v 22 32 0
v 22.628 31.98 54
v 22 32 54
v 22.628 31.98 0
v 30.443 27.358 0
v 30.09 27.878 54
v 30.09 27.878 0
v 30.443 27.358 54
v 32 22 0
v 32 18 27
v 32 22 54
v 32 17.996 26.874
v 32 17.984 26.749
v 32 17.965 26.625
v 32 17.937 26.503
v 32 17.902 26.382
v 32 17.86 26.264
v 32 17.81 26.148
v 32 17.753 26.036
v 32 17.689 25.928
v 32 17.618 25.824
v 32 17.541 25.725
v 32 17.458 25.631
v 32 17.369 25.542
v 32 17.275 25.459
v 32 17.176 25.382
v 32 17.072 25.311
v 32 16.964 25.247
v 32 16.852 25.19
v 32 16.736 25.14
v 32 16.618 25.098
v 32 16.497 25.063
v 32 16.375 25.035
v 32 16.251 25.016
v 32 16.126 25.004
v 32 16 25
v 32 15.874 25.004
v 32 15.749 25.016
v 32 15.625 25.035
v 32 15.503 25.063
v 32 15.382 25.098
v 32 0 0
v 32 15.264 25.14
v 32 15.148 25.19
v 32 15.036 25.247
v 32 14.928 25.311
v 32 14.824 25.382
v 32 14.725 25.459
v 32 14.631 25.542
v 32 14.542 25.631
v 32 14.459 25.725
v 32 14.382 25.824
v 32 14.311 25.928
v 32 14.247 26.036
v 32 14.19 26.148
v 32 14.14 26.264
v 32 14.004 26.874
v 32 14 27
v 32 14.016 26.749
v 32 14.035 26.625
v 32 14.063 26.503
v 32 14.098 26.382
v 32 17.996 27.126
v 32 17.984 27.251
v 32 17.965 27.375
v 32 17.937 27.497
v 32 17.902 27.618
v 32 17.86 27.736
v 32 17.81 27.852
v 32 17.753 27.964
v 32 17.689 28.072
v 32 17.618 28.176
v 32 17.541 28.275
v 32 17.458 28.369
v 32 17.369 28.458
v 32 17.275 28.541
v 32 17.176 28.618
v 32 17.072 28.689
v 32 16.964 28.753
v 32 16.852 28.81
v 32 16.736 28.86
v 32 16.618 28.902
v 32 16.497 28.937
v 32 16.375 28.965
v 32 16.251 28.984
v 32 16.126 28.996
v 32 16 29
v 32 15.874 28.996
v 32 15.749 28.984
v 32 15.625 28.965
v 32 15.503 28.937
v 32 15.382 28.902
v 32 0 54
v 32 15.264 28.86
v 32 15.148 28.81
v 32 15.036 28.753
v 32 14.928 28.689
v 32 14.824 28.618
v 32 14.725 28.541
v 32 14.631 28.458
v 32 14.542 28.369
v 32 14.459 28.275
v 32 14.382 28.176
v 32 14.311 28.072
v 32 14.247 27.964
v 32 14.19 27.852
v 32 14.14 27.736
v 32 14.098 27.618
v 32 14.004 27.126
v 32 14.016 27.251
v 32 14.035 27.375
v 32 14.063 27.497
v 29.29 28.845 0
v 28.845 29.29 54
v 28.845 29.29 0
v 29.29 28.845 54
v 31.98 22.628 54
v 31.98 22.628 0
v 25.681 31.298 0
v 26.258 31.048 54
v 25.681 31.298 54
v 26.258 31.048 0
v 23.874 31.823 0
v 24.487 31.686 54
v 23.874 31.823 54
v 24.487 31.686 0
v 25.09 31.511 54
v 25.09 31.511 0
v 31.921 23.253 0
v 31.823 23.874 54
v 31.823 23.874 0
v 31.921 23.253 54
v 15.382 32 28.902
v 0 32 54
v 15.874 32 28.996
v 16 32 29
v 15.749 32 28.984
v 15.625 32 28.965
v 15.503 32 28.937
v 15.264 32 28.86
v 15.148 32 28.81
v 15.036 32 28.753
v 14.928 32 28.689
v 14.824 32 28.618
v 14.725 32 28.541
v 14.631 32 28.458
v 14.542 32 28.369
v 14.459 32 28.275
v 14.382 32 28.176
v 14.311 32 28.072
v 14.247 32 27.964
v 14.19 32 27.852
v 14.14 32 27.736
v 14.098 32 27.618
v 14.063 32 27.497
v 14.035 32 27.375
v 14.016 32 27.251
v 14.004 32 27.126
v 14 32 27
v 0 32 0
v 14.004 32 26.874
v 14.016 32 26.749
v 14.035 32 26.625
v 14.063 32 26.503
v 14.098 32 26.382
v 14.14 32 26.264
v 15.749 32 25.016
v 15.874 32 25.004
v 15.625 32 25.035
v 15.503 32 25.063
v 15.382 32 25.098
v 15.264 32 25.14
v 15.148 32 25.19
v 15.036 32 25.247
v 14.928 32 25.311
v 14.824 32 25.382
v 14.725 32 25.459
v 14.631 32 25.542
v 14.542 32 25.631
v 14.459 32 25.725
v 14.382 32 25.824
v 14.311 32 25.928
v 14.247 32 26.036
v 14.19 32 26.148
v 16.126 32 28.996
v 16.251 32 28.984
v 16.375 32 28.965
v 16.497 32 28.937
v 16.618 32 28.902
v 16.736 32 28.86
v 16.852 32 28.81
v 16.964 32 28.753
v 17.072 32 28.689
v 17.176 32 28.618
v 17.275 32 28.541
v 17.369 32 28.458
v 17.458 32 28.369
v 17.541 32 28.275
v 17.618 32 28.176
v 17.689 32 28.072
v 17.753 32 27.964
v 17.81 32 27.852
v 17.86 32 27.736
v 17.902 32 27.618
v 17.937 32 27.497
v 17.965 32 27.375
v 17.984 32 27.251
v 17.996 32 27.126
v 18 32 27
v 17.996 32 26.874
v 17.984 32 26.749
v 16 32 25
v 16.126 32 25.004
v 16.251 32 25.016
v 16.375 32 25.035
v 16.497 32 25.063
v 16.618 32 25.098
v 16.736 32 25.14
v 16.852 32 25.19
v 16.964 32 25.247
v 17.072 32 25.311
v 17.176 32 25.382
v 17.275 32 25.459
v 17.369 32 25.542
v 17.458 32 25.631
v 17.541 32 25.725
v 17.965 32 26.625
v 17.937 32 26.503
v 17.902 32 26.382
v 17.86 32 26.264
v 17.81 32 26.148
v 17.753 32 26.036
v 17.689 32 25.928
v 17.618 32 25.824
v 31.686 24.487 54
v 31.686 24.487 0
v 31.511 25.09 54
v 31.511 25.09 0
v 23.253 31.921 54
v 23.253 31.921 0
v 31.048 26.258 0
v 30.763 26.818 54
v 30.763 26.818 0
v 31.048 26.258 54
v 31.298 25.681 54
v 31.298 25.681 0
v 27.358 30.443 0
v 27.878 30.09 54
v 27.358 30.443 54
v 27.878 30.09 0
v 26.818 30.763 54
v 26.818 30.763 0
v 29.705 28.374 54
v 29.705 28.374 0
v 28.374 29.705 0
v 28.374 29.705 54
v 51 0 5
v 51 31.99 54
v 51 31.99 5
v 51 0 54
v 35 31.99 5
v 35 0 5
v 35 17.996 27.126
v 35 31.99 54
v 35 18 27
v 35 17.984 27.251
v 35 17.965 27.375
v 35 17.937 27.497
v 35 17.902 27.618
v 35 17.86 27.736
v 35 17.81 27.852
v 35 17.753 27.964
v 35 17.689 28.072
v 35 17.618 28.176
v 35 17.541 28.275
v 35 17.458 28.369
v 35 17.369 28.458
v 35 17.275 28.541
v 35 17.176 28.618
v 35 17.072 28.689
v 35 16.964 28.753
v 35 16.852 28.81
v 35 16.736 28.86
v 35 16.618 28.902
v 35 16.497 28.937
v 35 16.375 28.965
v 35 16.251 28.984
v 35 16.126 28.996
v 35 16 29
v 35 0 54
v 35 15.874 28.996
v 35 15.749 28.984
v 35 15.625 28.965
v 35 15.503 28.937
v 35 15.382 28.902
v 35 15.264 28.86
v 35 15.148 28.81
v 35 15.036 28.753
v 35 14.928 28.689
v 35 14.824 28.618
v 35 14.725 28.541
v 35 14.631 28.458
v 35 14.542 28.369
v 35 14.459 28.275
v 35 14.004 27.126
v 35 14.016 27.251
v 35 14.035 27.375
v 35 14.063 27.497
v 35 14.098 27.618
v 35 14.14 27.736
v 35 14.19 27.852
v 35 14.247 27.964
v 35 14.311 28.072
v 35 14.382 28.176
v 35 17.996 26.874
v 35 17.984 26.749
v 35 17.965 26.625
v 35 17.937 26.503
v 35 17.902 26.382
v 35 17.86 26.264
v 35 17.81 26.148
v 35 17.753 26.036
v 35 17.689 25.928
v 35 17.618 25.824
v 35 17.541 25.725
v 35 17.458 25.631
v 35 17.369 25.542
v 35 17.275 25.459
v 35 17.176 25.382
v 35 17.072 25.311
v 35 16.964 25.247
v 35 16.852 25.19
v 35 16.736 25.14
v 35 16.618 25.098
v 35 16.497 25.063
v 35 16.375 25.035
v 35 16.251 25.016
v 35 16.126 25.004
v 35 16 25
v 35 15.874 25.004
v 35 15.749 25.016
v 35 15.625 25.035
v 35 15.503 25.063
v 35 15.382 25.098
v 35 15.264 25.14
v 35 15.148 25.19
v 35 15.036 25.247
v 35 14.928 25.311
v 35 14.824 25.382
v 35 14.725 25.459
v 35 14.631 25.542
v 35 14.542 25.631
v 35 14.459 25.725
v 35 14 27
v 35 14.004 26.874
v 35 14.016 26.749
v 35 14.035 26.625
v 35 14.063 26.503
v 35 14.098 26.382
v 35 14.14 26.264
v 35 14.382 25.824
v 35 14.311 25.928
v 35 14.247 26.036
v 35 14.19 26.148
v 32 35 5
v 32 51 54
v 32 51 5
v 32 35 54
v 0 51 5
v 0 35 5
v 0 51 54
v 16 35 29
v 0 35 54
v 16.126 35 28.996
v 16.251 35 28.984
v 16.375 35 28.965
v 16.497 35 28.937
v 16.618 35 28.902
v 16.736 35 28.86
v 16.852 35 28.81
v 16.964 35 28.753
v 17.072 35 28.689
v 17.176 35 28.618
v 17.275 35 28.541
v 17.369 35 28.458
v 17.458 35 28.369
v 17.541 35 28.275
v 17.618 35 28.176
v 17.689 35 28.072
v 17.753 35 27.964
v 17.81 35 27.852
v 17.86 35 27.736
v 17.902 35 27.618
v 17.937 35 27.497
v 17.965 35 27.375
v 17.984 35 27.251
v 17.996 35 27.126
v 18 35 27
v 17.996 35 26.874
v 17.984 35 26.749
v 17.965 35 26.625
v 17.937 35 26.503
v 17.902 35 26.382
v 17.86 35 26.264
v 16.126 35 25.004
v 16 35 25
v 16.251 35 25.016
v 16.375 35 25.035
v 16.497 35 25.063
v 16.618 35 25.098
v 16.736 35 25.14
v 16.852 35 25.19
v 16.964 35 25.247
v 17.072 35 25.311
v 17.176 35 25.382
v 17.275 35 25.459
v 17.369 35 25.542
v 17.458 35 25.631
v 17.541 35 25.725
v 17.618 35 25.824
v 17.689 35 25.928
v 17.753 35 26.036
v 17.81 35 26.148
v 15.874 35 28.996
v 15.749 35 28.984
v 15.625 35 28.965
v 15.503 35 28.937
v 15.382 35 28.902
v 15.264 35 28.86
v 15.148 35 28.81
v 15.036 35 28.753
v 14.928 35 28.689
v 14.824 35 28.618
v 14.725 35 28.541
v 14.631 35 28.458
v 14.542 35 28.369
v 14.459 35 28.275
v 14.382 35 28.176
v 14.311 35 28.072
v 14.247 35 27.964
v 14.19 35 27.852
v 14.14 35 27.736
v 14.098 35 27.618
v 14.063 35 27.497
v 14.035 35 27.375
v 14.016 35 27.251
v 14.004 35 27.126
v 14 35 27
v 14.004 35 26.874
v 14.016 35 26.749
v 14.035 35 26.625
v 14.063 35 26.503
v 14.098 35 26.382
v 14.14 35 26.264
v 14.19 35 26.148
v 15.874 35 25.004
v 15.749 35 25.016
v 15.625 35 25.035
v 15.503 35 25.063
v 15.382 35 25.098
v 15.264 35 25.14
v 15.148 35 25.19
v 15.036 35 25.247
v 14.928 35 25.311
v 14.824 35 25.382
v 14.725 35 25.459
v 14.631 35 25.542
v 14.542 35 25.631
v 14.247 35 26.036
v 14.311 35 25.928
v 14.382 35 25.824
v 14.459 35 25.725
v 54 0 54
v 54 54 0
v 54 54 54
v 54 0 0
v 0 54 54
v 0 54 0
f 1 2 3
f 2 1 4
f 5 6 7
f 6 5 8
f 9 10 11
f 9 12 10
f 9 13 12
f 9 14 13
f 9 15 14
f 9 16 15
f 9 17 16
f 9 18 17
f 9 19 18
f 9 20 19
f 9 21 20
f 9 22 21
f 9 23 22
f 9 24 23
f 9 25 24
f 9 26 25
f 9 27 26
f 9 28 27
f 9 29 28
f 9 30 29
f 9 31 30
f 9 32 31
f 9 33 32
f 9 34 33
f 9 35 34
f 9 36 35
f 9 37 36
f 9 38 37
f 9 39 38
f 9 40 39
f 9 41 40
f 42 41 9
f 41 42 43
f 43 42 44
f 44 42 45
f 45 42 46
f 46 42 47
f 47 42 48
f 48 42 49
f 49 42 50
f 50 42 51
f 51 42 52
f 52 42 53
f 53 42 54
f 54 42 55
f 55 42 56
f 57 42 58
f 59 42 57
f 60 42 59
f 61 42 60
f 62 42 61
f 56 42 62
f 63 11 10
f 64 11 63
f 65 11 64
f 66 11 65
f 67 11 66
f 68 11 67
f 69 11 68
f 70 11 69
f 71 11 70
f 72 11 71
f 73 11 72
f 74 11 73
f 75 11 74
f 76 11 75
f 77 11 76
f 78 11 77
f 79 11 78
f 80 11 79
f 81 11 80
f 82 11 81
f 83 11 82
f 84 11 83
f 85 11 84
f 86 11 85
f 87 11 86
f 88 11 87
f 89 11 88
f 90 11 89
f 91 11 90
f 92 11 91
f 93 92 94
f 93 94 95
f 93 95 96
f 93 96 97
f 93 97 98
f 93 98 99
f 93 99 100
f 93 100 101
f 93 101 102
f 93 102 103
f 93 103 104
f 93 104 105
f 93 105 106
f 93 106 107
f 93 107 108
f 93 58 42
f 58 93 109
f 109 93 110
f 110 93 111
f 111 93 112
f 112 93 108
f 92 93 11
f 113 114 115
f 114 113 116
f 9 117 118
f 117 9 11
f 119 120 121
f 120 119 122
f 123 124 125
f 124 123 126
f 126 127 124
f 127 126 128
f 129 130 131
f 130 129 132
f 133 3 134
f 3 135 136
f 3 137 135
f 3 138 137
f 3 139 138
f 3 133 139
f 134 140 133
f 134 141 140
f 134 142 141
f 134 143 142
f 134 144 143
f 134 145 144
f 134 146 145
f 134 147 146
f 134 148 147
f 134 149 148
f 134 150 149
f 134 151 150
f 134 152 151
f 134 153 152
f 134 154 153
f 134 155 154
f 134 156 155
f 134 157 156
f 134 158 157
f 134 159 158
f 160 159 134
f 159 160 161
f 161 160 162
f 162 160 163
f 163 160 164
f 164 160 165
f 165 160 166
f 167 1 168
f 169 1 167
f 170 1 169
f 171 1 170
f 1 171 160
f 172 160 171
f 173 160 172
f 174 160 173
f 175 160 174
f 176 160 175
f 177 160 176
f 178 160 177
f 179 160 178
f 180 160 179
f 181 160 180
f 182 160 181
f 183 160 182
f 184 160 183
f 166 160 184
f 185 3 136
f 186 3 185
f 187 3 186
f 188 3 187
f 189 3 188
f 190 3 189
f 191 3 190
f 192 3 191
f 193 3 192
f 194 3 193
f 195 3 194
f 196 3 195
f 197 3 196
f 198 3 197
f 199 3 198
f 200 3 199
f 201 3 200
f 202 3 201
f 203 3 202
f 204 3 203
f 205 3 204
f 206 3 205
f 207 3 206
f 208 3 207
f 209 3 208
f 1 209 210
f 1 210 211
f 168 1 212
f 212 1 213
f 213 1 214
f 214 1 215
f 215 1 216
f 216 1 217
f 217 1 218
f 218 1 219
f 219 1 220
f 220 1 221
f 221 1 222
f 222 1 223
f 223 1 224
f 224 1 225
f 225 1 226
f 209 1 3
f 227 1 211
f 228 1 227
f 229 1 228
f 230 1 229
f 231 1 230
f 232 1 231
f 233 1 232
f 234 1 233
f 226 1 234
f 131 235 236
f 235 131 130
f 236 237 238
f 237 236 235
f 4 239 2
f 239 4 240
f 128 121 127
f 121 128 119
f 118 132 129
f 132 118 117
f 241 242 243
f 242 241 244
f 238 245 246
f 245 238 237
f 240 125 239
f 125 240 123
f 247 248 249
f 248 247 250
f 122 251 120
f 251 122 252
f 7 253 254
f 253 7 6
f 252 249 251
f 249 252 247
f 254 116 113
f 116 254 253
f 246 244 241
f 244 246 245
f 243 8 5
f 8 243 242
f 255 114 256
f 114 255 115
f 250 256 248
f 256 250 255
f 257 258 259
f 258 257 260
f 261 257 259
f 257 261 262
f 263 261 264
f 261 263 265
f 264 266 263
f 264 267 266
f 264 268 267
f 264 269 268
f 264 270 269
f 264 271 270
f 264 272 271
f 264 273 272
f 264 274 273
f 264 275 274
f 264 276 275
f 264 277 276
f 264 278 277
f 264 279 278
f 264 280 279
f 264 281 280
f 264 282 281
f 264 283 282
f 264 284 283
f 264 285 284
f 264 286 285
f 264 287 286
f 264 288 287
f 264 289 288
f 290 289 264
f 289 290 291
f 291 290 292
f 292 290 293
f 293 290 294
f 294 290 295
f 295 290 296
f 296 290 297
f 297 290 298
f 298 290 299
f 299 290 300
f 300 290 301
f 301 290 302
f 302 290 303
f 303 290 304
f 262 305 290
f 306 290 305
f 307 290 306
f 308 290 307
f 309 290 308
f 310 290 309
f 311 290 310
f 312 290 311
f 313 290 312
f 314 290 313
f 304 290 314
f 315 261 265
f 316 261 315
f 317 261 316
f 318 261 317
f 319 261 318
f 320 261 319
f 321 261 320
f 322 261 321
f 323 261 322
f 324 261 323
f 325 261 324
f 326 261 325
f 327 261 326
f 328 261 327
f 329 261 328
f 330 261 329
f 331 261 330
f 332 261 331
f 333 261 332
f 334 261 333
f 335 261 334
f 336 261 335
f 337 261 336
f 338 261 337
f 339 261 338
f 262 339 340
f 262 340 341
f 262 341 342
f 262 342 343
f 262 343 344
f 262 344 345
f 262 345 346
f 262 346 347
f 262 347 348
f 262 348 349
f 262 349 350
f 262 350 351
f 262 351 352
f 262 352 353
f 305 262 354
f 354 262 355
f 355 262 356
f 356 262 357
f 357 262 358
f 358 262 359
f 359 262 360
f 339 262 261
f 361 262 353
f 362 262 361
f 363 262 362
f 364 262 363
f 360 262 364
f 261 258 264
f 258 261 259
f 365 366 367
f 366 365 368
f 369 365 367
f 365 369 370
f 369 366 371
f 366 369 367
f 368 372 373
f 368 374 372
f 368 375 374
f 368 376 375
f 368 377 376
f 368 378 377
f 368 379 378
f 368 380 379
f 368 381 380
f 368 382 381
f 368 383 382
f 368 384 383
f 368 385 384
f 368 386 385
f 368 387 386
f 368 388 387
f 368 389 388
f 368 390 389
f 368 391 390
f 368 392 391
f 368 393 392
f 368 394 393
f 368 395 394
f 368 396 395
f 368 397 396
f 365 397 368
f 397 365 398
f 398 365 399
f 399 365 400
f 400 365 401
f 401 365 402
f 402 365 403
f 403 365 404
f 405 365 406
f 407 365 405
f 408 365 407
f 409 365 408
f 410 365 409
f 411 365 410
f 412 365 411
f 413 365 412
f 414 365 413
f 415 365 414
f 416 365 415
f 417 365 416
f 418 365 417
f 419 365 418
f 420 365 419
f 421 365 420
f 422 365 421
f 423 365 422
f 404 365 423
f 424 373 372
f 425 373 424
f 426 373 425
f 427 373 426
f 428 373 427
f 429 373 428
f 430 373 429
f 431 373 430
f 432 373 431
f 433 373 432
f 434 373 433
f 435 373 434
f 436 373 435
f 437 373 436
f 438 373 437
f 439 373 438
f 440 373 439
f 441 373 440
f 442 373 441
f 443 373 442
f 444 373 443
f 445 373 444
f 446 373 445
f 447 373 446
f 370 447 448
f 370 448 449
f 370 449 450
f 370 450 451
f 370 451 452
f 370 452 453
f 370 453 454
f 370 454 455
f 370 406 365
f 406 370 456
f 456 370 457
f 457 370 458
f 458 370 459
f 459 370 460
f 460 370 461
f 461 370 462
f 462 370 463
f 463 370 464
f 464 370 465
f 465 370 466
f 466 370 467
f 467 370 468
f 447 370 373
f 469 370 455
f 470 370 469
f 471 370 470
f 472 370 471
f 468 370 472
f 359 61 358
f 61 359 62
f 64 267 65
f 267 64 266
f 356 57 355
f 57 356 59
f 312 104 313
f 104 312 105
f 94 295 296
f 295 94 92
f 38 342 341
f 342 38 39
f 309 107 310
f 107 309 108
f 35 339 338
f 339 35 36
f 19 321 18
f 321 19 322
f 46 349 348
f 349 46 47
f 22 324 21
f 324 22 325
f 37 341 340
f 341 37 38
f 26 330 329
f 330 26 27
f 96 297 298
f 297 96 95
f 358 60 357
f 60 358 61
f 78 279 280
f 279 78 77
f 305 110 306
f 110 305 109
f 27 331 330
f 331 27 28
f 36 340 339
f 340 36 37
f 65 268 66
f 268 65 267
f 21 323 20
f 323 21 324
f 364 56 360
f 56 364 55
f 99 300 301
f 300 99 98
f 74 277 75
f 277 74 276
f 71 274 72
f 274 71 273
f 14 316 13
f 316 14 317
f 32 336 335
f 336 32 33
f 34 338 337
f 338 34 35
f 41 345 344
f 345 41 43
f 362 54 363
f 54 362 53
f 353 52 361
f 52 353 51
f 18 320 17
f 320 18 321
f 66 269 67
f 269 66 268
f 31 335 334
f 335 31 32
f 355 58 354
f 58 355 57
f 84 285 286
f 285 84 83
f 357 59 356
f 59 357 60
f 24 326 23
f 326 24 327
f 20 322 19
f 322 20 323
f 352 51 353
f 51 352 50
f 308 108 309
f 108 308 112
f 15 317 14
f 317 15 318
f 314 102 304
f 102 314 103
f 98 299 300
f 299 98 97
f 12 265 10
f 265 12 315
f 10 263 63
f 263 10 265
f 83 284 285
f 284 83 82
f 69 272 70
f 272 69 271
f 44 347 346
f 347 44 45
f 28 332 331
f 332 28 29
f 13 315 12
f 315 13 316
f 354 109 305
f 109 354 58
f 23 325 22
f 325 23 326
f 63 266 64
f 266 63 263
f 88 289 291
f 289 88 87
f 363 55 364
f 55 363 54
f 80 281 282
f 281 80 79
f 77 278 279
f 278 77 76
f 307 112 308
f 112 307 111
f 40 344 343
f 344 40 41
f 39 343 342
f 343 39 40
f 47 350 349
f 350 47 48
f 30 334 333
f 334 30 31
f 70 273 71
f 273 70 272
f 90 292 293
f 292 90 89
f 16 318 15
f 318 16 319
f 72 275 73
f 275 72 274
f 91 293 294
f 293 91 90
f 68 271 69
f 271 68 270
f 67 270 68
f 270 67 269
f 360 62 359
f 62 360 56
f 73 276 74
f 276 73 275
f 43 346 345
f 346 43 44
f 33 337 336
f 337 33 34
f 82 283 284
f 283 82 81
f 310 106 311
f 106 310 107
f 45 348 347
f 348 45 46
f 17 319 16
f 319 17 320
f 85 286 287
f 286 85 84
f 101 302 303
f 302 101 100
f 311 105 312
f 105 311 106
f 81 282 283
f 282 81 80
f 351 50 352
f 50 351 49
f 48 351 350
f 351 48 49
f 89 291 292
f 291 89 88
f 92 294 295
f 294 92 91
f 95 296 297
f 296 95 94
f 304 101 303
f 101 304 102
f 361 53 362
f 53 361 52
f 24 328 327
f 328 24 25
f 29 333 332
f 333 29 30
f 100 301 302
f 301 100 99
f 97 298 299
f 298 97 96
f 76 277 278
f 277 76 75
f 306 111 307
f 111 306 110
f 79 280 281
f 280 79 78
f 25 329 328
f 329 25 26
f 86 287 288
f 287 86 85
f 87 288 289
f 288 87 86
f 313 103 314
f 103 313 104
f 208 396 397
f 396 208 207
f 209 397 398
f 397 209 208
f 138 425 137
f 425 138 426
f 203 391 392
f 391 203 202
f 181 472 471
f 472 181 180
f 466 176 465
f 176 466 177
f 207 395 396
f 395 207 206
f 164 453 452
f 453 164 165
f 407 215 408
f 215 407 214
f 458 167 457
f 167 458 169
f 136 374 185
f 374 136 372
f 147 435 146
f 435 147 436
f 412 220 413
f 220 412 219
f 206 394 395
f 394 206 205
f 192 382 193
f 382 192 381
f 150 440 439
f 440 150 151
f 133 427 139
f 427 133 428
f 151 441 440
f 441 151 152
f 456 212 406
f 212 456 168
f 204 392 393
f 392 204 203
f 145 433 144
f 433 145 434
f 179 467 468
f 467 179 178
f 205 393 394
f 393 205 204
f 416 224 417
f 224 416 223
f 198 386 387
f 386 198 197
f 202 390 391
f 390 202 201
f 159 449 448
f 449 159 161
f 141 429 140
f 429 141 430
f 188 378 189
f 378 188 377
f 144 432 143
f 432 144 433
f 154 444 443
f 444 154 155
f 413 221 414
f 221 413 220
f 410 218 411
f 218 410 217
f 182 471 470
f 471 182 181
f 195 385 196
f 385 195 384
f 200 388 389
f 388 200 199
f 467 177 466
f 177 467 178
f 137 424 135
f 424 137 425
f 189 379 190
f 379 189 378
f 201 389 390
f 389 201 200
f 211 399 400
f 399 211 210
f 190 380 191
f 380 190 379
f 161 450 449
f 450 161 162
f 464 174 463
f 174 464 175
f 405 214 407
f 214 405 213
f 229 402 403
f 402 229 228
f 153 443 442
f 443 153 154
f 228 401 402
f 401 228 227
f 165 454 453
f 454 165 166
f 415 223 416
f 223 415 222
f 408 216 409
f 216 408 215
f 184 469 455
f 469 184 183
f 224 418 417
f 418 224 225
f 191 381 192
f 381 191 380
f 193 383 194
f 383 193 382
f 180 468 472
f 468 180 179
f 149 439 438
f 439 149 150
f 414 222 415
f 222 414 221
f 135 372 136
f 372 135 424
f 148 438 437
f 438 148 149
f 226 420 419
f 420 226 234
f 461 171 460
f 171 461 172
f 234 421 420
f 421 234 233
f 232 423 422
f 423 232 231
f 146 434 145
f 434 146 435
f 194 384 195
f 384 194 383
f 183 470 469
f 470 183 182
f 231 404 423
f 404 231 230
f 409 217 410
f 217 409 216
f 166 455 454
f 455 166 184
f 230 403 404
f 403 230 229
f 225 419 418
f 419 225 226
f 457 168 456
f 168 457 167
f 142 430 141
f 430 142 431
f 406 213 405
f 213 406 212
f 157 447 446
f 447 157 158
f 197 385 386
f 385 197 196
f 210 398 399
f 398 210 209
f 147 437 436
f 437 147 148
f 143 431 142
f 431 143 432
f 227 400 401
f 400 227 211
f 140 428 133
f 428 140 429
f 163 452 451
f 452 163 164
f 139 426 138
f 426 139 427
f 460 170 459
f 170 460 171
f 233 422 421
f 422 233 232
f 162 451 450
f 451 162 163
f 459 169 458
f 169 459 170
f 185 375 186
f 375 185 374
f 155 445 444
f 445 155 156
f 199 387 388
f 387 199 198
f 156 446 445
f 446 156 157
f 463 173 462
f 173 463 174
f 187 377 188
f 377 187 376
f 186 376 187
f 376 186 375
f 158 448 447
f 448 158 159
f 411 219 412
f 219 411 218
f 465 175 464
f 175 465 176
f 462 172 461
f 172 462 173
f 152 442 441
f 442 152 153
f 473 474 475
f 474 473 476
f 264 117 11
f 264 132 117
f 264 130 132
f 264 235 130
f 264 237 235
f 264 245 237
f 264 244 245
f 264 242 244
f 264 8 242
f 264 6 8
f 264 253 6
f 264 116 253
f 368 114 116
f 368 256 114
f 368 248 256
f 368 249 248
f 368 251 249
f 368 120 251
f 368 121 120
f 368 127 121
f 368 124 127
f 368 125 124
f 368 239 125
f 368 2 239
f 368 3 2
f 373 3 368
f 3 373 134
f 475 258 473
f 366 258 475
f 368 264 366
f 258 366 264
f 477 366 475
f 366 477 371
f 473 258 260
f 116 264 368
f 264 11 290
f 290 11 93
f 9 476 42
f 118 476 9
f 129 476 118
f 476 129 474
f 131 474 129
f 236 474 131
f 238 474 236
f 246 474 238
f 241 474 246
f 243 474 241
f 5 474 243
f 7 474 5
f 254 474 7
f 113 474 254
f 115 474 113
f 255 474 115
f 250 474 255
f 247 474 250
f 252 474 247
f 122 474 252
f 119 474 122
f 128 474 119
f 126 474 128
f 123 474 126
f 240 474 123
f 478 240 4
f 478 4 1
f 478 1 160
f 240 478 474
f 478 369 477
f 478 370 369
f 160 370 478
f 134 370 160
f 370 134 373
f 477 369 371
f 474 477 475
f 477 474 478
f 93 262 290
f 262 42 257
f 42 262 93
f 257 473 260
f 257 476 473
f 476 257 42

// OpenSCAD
/***********************************************************************************************************************************
'Shelfie' Do it yourself shelf and storage designer by: Mike Thompson 10/4/2015, http://www.thingiverse.com/mike_linus
Based on original concept idea from Milla Niskakoski http://www.thingiverse.com/thing:681835

Licensing: This work is licensed under a Creative Commons Attribution-NonCommercial-ShareAlike 3.0 Australia License.  Further 
information is available here - http://creativecommons.org/licenses/by-nc-sa/3.0/au/deed.en_GB

I was very impressed with the simplicity and practicality of Milla's initial design, but ran into some major limitations when trying to
construct my own shelves.  The key issues I encountered were:
- No customisable thicknesses. Like may others, I wanted to use the scrap wood I had lying around rather than purchase new material.
- No mixed thicknesses. I wanted to use glass shelves with wood sides, but it wasn't possible unless they were the same thickness.
- No wall mounting bracket option.  Particularly for tall shelves, this is an important safety feature.
- No ability to alter the size of the bracket or the wall thickness to increase strength.
- No ability to attach a shelf midspan.  This is a big issue if you have long sections and want to add a shelf in-between.

Shelfie provides full control over all parameters so you can mix materials of any thickness, add wall mounts, alter the bracket size,
mid mount shelves, change the screw hole size etc. 

Note: incremental 0.01 values added to fix diplay anomalies when using preview (F5)

Instructions: select the bracket type and options to suit your particular materials below. 
************************************************************************************************************************************/

/**************************************************************************
Enter the values corresponding to your bracket requirements in this section
***************************************************************************/

/* [Bracket Options] */

//Bracket Type
bracket_type="L";//[L,T,X,L Foot,T Foot]
//Bracket cube size
bracket_size = 54;//54
//Thickness of Panel 1
panel_thickness = 16;
//Thickness of Panel 2
panel2_thickness = 16;
//Flip bracket for opposite orientation
flip = "false";//[false,true]
//Thickness of panel walls
wall_thickness = 3;
//Thickness of base
base_thickness=5;
//Hole radius (set to 0 to remove)
hole_radius=2;
//Allow pass through for mid-span brackets
pass_through="false";//[false,true]
//Add wall mount plate
wall_mount = "false";//[false,true]

/* [Hidden] */
$fn=100;

panel_depth=bracket_size-panel_thickness-(wall_thickness*2);
panel_depth2=bracket_size-panel2_thickness-(wall_thickness*2);

module L_piece()
{
    difference()
    {
        cube(bracket_size);
        union()
        {
            hull()//corner cutout
            {
                if(wall_mount=="true")
                {
                    translate([0,0,wall_thickness])
                    {
                        translate([-0.001,-0.001,-0.001])cube([10,10,bracket_size]);
                        translate([bracket_size-panel_thickness-(wall_thickness*2)-10,0,-0.01])cube([10,10,bracket_size]);
                        translate([-0.01,bracket_size-panel2_thickness-(wall_thickness*2)-10,-0.01])cube([10,10,bracket_size]);
                        translate([bracket_size-panel_thickness-(wall_thickness*2)-10,bracket_size-panel2_thickness-(wall_thickness*2)-10,0])cylinder(h=bracket_size,r=10);
                    }
                }
                else
                {
                    translate([-0.001,-0.001,-0.001])cube([10,10,bracket_size+0.01]);
                    translate([bracket_size-panel_thickness-(wall_thickness*2)-10,-0.01,-0.01])cube([10,10,bracket_size+0.02]);
                    translate([-0.01,bracket_size-panel2_thickness-(wall_thickness*2)-10,-0.01])cube([10,10,bracket_size+0.02]);
                    translate([bracket_size-panel_thickness-(wall_thickness*2)-10,bracket_size-panel2_thickness-(wall_thickness*2)-10,0])cylinder(h=bracket_size+0.02,r=10);
                }
            }
            if(wall_mount=="true") //cut hole in wall mount area
            {
                translate([bracket_size/3,bracket_size/3,0])cylinder(r=hole_radius,h=wall_thickness+0.01);
            }
            //panel cutout
            translate([bracket_size-wall_thickness-panel_thickness,-0.01,base_thickness])cube([panel_thickness,panel_depth2,bracket_size-base_thickness+0.01]);
            //panel2 cutout
            if (pass_through=="true")
            {
                translate([-0.01,bracket_size-wall_thickness-panel2_thickness,base_thickness])cube([bracket_size+0.02,panel2_thickness,bracket_size-base_thickness+0.01]);
            }
            else
            {
                translate([-0.01,bracket_size-wall_thickness-panel2_thickness,base_thickness])cube([panel_depth+0.01,panel2_thickness,bracket_size-base_thickness+0.01]);
            }
            //inside holes
            translate([panel_depth,panel_depth2/2,bracket_size/2])rotate([0,90,0])cylinder(h=wall_thickness+0.01,r=hole_radius);
            translate([panel_depth/2,panel_depth2+wall_thickness,bracket_size/2])rotate([90,0,0])cylinder(h=wall_thickness++0.01,r=hole_radius);
        }
    }
}

module T_piece()
{
    difference()
    {
        union()
        {
            L_piece();
            translate([(bracket_size*2)-(wall_thickness*2)-panel_thickness,0,0])mirror(0,1,0)L_piece();
        }
        //repunch holes
        translate([panel_depth-0.5,panel_depth2/2,bracket_size/2])rotate([0,90,0])cylinder(h=(wall_thickness*2)+panel_thickness+1,r=hole_radius);
    }
}

module X_piece()
{
    difference()
    {
        union()
        {
            T_piece();
            translate([(bracket_size*2)-(wall_thickness*2)-panel_thickness,(bracket_size*2)-(wall_thickness*2)-panel2_thickness,0])rotate([0,0,180])T_piece();
        }
        //repunch holes
        translate([panel_depth/2,panel_depth+panel_thickness+(wall_thickness*2),bracket_size/2])rotate([90,0,0])cylinder(h=(wall_thickness*2)+panel2_thickness+1,r=hole_radius);
        translate([(panel_depth/2)+bracket_size,panel_depth+panel_thickness+(wall_thickness*2),bracket_size/2])rotate([90,0,0])cylinder(h=(wall_thickness*2)+panel2_thickness+1,r=hole_radius);
    }
}

module L_foot()
{
    L_piece();
    translate([bracket_size,bracket_size+(bracket_size*0.60),0])mirror(0,0,1)rotate([90,0,0])
    hull()
    {
        cube(30);
        translate([0,0,bracket_size*0.60])cube([bracket_size,bracket_size,1]);
    }
}

module T_foot()
{
    T_piece();
    translate([bracket_size-wall_thickness-(panel_thickness/2),bracket_size+(bracket_size*0.60),0])mirror(0,0,1)rotate([90,0,0])
    hull()
    {
       translate([-15,0,0])cube(30);
       translate([-bracket_size/2,0,bracket_size*0.60])cube([bracket_size,bracket_size,1]);
    }
}

if (bracket_type=="L")
{
    if(flip=="true")
    {
        mirror()L_piece();
    }
    else
    {
        L_piece();
    }
}
if (bracket_type=="T")
{
    T_piece();
}
if (bracket_type=="X")
{
    X_piece();
}
if (bracket_type=="L Foot")
{
    if(flip=="true")
    {
        mirror()L_foot();
    }
    else
    {
        L_foot();
    }
}
if (bracket_type=="T Foot")
{
    T_foot();
}
